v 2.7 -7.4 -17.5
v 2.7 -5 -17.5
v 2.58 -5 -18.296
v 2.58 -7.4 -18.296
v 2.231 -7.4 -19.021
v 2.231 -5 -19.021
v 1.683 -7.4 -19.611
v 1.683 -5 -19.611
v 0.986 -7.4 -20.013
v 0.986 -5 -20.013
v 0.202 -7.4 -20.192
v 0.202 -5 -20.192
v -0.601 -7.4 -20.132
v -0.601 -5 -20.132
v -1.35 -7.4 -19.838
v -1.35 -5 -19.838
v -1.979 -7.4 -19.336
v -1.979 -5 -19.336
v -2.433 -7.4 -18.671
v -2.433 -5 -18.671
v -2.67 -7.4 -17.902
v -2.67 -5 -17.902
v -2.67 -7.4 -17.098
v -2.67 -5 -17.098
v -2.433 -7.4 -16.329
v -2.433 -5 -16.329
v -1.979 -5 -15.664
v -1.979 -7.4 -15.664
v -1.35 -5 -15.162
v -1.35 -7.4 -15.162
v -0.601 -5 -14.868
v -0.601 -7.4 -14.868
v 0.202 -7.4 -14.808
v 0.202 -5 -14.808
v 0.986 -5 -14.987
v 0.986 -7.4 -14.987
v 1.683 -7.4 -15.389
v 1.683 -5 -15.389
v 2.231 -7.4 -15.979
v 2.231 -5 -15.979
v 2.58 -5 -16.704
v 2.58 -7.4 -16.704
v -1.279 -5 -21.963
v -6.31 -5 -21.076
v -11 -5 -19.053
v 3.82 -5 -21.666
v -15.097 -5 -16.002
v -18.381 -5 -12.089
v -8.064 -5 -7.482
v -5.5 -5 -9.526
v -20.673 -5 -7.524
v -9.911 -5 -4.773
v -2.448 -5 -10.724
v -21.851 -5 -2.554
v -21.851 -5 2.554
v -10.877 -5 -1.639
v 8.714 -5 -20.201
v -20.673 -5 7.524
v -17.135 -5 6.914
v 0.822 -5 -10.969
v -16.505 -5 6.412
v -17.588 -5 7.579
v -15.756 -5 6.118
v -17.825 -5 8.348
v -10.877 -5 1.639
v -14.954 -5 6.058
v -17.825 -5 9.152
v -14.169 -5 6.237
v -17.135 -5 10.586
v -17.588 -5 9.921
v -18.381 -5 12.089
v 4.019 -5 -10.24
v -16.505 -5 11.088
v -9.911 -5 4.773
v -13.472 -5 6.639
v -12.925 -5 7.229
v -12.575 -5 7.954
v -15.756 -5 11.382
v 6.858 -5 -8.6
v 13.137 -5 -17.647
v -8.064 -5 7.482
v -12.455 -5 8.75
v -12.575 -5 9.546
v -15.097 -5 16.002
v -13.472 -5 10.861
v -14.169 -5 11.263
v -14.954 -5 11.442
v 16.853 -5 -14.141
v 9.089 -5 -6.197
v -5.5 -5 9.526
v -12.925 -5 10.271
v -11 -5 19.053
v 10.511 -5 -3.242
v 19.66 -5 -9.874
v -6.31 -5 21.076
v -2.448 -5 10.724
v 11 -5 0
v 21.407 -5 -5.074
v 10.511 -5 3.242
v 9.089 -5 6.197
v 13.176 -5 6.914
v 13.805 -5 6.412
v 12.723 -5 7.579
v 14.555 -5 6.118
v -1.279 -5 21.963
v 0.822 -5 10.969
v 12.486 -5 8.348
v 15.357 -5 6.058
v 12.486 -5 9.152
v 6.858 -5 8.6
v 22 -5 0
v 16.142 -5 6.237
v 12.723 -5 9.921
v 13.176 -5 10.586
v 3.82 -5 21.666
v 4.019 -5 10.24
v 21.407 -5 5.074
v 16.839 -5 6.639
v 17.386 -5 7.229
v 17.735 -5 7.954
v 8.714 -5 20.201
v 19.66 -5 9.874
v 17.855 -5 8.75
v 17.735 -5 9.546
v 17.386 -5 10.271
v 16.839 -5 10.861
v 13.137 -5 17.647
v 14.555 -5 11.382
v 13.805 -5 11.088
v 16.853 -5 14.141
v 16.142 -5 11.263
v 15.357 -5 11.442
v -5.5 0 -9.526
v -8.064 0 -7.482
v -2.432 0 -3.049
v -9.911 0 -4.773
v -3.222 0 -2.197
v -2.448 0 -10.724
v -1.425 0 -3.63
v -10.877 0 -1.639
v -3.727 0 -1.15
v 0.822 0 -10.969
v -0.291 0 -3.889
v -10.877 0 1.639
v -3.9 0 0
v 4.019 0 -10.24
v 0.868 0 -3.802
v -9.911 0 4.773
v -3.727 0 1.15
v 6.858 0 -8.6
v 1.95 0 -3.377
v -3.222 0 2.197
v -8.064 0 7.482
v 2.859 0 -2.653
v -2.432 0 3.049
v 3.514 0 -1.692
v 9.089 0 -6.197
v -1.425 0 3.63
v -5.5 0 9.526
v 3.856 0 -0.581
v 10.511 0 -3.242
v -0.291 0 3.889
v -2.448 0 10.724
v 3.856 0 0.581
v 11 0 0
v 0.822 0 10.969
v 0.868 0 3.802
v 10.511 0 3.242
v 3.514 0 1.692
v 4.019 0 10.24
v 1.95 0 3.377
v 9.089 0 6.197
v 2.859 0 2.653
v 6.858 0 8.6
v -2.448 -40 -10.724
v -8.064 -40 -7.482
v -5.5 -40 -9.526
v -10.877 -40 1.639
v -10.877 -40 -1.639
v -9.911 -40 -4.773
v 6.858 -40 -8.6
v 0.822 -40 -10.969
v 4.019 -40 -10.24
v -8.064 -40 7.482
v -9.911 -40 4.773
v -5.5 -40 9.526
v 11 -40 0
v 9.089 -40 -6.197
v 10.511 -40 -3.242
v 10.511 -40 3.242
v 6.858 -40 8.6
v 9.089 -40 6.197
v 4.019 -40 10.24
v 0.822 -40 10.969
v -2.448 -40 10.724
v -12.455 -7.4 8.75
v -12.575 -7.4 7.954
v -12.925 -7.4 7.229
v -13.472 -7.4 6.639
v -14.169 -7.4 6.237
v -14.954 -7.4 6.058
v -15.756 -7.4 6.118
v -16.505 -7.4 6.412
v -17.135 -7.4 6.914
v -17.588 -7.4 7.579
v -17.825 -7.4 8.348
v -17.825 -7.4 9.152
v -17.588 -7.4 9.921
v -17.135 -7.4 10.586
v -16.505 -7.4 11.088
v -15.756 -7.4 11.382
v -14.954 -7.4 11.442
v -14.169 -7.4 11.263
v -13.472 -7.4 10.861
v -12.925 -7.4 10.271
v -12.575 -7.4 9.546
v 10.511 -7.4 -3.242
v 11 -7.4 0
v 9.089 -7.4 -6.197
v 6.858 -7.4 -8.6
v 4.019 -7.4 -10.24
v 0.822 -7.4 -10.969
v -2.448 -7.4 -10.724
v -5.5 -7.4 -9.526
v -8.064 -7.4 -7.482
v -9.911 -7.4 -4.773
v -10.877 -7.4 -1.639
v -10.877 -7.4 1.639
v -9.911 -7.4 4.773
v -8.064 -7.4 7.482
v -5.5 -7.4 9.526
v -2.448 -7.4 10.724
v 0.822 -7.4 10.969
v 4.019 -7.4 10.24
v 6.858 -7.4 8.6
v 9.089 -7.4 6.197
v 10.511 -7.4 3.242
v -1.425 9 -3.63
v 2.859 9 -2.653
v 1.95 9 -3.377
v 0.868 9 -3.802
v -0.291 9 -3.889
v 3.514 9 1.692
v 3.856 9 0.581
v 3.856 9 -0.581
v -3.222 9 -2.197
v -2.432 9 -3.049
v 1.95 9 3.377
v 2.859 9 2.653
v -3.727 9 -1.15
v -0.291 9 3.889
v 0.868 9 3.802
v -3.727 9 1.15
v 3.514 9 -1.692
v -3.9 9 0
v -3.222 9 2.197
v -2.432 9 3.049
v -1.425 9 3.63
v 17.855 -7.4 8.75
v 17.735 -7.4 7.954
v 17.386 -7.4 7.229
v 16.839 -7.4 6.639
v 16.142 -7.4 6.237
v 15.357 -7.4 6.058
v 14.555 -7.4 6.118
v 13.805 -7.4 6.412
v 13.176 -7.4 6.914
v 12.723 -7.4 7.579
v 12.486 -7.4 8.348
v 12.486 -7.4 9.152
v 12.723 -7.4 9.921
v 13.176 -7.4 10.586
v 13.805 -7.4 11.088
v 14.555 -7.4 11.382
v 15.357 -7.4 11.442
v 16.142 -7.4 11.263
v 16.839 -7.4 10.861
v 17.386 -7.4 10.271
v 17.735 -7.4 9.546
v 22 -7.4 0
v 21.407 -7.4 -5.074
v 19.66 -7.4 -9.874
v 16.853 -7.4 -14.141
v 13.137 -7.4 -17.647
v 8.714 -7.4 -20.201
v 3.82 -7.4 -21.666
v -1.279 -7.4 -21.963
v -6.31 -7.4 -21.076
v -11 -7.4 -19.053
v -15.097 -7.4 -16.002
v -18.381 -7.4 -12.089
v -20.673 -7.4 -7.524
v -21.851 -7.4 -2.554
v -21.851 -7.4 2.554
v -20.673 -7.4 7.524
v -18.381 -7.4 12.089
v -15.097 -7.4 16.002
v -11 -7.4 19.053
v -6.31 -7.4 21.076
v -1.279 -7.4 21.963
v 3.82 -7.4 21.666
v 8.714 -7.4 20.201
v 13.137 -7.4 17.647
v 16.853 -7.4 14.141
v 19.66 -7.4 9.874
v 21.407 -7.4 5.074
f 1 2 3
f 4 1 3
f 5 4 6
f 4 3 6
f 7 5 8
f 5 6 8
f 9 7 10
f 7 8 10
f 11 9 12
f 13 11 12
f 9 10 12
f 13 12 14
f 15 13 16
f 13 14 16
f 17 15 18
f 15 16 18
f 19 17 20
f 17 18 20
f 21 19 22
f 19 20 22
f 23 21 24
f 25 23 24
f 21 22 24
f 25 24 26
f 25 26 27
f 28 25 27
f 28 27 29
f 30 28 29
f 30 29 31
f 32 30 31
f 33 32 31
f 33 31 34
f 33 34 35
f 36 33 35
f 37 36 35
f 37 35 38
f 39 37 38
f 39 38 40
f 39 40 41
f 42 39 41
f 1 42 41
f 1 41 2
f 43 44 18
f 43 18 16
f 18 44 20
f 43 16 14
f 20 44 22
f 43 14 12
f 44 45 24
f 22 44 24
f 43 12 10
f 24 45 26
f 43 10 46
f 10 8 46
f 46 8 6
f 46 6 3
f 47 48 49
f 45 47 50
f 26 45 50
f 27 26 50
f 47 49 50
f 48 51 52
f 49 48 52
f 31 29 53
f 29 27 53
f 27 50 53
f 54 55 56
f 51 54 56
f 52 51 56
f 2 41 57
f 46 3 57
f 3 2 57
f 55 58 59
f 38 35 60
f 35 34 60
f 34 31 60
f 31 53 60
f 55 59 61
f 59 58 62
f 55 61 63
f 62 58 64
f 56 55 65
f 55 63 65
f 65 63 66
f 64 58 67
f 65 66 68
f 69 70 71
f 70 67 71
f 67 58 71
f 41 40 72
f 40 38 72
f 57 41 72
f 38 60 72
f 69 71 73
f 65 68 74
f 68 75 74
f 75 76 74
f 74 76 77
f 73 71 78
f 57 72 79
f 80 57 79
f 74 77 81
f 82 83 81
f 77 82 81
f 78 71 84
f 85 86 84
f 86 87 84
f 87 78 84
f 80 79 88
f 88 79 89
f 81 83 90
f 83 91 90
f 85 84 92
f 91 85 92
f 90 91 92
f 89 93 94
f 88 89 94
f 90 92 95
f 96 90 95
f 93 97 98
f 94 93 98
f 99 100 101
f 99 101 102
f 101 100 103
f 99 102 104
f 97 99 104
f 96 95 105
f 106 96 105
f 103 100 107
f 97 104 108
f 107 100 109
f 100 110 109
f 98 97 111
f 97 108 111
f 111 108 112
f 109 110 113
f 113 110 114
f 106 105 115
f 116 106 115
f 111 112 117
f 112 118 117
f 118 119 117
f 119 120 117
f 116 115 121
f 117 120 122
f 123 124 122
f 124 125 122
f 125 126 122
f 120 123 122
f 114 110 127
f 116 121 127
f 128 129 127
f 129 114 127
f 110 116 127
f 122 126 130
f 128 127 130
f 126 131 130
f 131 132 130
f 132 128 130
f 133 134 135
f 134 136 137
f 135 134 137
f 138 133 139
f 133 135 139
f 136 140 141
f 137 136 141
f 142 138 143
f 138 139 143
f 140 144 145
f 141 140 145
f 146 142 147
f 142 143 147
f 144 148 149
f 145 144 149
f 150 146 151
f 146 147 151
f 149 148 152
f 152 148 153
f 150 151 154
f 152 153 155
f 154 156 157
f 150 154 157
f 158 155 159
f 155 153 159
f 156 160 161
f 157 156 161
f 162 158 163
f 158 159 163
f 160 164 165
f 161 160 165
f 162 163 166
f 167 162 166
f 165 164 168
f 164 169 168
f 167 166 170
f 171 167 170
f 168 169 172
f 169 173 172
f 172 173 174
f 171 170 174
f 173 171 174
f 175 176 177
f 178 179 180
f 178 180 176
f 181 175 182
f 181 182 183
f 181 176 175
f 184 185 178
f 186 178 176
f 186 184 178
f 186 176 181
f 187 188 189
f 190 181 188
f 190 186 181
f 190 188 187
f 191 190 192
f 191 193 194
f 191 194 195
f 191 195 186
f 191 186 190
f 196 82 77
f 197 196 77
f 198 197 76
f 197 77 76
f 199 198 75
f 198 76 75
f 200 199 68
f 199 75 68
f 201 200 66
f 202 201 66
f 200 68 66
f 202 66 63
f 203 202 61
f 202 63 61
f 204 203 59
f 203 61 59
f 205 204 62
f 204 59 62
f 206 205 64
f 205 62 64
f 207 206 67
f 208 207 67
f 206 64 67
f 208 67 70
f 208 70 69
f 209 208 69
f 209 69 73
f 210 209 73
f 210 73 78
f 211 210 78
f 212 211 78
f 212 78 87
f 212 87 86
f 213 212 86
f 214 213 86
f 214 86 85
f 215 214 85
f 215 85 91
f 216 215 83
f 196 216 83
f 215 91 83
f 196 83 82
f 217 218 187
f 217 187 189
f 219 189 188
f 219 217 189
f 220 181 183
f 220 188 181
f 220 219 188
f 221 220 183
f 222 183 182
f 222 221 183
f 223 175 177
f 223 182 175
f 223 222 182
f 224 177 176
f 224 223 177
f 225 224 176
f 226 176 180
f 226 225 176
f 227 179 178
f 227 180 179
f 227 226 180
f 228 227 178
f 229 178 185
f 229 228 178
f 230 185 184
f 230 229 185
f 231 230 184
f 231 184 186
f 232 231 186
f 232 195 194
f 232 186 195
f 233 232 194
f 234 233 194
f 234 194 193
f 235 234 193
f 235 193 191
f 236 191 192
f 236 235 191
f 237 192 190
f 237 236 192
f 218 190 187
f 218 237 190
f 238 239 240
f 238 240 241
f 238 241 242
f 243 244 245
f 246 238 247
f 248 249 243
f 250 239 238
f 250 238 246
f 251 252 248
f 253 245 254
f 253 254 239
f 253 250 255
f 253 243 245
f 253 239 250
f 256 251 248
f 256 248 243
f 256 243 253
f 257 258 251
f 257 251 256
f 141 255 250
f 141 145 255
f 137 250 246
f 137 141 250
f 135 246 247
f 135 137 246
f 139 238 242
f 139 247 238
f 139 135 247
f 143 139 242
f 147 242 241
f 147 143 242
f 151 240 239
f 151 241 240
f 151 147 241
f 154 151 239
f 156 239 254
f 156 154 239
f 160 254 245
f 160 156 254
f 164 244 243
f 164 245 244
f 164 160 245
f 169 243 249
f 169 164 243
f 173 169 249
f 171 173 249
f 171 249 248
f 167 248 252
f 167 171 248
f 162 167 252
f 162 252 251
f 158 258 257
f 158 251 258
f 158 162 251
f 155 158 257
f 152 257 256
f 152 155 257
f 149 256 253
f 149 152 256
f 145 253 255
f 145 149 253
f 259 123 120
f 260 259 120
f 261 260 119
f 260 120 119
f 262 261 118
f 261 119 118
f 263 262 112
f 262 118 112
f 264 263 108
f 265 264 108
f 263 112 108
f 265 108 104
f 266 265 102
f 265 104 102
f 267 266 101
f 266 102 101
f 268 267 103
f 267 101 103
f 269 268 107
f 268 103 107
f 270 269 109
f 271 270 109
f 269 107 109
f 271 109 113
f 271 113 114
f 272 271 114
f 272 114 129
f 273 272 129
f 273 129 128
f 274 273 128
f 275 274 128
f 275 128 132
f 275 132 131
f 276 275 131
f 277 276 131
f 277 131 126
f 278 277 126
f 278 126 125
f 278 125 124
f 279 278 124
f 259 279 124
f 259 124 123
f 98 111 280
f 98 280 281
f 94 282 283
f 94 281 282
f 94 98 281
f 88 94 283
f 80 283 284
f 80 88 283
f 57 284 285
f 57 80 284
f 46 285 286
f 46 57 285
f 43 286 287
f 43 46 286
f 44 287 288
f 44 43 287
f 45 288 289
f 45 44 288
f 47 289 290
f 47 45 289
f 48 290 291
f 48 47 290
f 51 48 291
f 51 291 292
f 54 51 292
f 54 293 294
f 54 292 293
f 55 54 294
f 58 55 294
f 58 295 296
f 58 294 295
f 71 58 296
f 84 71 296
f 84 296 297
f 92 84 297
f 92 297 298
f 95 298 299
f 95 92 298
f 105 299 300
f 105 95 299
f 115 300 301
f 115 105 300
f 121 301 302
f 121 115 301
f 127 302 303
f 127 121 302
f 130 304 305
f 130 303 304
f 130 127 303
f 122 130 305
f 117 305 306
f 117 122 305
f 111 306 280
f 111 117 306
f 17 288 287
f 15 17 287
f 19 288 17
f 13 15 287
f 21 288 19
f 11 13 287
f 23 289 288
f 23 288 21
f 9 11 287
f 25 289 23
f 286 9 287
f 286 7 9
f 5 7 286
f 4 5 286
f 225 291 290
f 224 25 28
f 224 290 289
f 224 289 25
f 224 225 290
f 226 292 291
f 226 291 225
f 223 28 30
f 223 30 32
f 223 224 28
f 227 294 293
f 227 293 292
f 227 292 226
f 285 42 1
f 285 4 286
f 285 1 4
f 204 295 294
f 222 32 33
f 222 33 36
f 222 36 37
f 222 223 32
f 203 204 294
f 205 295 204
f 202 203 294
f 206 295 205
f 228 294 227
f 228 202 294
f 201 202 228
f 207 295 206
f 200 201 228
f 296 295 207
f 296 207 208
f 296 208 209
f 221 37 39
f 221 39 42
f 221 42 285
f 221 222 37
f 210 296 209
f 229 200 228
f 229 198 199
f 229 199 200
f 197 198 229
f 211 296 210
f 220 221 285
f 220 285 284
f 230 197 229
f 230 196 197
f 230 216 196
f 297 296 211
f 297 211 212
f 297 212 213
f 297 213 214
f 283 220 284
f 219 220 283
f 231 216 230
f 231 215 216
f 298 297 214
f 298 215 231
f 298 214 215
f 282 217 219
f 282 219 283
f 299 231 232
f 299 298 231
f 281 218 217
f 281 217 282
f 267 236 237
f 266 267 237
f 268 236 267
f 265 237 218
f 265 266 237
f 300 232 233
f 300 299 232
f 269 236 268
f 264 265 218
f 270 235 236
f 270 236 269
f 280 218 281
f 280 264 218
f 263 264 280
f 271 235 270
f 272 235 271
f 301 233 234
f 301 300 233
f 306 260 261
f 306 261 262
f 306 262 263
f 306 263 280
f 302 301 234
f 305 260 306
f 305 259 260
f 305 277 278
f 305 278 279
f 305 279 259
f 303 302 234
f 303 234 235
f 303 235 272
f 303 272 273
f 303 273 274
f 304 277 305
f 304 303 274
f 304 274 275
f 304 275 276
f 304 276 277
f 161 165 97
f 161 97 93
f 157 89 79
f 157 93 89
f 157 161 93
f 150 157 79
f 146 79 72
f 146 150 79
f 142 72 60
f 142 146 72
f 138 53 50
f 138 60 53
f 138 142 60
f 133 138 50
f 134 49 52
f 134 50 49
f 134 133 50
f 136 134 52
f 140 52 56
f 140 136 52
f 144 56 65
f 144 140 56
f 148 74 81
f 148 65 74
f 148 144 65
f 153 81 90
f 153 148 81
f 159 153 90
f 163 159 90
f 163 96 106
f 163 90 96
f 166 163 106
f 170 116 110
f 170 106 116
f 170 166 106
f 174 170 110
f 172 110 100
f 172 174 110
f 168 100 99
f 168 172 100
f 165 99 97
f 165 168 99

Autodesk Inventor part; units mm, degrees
ref_plane "YZ Plane" through (0, 0, 0) normal (1, 0, 0) x (0, 1, 0)
ref_plane "XZ Plane" through (0, 0, 0) normal (0, 1, 0) x (-1, 0, 0)
ref_plane "XY Plane" through (0, 0, 0) normal (0, 0, 1) x (1, 0, 0)
sketch "Sketch1" plane through (0, 0, 0) normal (0, 1, 0) x (-1, 0, 0)
  circle A0 centre (0, 0) radius 3.9
  dimension "d0" = 7.8
extrude "Extrusion1" add sketch "Sketch1" along normal blind 9
sketch "Sketch2" plane through (0, 0, 0) normal (0, -1, 0) x (1, 0, 0)
  circle A0 centre (0, 0) radius 11
  dimension "d3" = 22
extrude "Extrusion2" add sketch "Sketch2" along normal blind 5
sketch "Sketch3" plane through (0, -5, 0) normal (0, -1, 0) x (1, 0, 0)
  circle A0 centre (0, 0) radius 3.9 projected
  circle A1 centre (0, 0) radius 22
  dimension "d6" = 44
extrude "Extrusion3" add sketch "Sketch3" along normal blind 2.4 contours A0 | A1
sketch "Sketch4" plane through (0, -7.4, 0) normal (0, -1, 0) x (1, 0, 0)
  circle A0 centre (0, 0) radius 11
  dimension "d9" = 22
extrude "Extrusion4" add sketch "Sketch4" along normal blind 32.6
sketch "Sketch6" plane through (0, -5, 0) normal (0, 1, 0) x (1, 0, 0)
  circle A0 centre (0, 0) radius 22 projected
  circle A1 centre (0, 0) radius 11 projected
  circle A2 centre (0, 0) radius 17.5
  circle A3 centre (0, 17.5) radius 2.7
  circle A4 centre (-15.1554, -8.75) radius 2.7
  circle A5 centre (15.1554, -8.75) radius 2.7
  dimension "d12" = 35
  dimension "d13" = 5.4
  dimension "d16" = 360
extrude "Extrusion5" cut sketch "Sketch6" against normal blind 27.6 contours A3 A2 | A2 A3 | A5 A2 | A2 A5 | A4 A2 | A2 A4
properties part number "Slip_ring"
